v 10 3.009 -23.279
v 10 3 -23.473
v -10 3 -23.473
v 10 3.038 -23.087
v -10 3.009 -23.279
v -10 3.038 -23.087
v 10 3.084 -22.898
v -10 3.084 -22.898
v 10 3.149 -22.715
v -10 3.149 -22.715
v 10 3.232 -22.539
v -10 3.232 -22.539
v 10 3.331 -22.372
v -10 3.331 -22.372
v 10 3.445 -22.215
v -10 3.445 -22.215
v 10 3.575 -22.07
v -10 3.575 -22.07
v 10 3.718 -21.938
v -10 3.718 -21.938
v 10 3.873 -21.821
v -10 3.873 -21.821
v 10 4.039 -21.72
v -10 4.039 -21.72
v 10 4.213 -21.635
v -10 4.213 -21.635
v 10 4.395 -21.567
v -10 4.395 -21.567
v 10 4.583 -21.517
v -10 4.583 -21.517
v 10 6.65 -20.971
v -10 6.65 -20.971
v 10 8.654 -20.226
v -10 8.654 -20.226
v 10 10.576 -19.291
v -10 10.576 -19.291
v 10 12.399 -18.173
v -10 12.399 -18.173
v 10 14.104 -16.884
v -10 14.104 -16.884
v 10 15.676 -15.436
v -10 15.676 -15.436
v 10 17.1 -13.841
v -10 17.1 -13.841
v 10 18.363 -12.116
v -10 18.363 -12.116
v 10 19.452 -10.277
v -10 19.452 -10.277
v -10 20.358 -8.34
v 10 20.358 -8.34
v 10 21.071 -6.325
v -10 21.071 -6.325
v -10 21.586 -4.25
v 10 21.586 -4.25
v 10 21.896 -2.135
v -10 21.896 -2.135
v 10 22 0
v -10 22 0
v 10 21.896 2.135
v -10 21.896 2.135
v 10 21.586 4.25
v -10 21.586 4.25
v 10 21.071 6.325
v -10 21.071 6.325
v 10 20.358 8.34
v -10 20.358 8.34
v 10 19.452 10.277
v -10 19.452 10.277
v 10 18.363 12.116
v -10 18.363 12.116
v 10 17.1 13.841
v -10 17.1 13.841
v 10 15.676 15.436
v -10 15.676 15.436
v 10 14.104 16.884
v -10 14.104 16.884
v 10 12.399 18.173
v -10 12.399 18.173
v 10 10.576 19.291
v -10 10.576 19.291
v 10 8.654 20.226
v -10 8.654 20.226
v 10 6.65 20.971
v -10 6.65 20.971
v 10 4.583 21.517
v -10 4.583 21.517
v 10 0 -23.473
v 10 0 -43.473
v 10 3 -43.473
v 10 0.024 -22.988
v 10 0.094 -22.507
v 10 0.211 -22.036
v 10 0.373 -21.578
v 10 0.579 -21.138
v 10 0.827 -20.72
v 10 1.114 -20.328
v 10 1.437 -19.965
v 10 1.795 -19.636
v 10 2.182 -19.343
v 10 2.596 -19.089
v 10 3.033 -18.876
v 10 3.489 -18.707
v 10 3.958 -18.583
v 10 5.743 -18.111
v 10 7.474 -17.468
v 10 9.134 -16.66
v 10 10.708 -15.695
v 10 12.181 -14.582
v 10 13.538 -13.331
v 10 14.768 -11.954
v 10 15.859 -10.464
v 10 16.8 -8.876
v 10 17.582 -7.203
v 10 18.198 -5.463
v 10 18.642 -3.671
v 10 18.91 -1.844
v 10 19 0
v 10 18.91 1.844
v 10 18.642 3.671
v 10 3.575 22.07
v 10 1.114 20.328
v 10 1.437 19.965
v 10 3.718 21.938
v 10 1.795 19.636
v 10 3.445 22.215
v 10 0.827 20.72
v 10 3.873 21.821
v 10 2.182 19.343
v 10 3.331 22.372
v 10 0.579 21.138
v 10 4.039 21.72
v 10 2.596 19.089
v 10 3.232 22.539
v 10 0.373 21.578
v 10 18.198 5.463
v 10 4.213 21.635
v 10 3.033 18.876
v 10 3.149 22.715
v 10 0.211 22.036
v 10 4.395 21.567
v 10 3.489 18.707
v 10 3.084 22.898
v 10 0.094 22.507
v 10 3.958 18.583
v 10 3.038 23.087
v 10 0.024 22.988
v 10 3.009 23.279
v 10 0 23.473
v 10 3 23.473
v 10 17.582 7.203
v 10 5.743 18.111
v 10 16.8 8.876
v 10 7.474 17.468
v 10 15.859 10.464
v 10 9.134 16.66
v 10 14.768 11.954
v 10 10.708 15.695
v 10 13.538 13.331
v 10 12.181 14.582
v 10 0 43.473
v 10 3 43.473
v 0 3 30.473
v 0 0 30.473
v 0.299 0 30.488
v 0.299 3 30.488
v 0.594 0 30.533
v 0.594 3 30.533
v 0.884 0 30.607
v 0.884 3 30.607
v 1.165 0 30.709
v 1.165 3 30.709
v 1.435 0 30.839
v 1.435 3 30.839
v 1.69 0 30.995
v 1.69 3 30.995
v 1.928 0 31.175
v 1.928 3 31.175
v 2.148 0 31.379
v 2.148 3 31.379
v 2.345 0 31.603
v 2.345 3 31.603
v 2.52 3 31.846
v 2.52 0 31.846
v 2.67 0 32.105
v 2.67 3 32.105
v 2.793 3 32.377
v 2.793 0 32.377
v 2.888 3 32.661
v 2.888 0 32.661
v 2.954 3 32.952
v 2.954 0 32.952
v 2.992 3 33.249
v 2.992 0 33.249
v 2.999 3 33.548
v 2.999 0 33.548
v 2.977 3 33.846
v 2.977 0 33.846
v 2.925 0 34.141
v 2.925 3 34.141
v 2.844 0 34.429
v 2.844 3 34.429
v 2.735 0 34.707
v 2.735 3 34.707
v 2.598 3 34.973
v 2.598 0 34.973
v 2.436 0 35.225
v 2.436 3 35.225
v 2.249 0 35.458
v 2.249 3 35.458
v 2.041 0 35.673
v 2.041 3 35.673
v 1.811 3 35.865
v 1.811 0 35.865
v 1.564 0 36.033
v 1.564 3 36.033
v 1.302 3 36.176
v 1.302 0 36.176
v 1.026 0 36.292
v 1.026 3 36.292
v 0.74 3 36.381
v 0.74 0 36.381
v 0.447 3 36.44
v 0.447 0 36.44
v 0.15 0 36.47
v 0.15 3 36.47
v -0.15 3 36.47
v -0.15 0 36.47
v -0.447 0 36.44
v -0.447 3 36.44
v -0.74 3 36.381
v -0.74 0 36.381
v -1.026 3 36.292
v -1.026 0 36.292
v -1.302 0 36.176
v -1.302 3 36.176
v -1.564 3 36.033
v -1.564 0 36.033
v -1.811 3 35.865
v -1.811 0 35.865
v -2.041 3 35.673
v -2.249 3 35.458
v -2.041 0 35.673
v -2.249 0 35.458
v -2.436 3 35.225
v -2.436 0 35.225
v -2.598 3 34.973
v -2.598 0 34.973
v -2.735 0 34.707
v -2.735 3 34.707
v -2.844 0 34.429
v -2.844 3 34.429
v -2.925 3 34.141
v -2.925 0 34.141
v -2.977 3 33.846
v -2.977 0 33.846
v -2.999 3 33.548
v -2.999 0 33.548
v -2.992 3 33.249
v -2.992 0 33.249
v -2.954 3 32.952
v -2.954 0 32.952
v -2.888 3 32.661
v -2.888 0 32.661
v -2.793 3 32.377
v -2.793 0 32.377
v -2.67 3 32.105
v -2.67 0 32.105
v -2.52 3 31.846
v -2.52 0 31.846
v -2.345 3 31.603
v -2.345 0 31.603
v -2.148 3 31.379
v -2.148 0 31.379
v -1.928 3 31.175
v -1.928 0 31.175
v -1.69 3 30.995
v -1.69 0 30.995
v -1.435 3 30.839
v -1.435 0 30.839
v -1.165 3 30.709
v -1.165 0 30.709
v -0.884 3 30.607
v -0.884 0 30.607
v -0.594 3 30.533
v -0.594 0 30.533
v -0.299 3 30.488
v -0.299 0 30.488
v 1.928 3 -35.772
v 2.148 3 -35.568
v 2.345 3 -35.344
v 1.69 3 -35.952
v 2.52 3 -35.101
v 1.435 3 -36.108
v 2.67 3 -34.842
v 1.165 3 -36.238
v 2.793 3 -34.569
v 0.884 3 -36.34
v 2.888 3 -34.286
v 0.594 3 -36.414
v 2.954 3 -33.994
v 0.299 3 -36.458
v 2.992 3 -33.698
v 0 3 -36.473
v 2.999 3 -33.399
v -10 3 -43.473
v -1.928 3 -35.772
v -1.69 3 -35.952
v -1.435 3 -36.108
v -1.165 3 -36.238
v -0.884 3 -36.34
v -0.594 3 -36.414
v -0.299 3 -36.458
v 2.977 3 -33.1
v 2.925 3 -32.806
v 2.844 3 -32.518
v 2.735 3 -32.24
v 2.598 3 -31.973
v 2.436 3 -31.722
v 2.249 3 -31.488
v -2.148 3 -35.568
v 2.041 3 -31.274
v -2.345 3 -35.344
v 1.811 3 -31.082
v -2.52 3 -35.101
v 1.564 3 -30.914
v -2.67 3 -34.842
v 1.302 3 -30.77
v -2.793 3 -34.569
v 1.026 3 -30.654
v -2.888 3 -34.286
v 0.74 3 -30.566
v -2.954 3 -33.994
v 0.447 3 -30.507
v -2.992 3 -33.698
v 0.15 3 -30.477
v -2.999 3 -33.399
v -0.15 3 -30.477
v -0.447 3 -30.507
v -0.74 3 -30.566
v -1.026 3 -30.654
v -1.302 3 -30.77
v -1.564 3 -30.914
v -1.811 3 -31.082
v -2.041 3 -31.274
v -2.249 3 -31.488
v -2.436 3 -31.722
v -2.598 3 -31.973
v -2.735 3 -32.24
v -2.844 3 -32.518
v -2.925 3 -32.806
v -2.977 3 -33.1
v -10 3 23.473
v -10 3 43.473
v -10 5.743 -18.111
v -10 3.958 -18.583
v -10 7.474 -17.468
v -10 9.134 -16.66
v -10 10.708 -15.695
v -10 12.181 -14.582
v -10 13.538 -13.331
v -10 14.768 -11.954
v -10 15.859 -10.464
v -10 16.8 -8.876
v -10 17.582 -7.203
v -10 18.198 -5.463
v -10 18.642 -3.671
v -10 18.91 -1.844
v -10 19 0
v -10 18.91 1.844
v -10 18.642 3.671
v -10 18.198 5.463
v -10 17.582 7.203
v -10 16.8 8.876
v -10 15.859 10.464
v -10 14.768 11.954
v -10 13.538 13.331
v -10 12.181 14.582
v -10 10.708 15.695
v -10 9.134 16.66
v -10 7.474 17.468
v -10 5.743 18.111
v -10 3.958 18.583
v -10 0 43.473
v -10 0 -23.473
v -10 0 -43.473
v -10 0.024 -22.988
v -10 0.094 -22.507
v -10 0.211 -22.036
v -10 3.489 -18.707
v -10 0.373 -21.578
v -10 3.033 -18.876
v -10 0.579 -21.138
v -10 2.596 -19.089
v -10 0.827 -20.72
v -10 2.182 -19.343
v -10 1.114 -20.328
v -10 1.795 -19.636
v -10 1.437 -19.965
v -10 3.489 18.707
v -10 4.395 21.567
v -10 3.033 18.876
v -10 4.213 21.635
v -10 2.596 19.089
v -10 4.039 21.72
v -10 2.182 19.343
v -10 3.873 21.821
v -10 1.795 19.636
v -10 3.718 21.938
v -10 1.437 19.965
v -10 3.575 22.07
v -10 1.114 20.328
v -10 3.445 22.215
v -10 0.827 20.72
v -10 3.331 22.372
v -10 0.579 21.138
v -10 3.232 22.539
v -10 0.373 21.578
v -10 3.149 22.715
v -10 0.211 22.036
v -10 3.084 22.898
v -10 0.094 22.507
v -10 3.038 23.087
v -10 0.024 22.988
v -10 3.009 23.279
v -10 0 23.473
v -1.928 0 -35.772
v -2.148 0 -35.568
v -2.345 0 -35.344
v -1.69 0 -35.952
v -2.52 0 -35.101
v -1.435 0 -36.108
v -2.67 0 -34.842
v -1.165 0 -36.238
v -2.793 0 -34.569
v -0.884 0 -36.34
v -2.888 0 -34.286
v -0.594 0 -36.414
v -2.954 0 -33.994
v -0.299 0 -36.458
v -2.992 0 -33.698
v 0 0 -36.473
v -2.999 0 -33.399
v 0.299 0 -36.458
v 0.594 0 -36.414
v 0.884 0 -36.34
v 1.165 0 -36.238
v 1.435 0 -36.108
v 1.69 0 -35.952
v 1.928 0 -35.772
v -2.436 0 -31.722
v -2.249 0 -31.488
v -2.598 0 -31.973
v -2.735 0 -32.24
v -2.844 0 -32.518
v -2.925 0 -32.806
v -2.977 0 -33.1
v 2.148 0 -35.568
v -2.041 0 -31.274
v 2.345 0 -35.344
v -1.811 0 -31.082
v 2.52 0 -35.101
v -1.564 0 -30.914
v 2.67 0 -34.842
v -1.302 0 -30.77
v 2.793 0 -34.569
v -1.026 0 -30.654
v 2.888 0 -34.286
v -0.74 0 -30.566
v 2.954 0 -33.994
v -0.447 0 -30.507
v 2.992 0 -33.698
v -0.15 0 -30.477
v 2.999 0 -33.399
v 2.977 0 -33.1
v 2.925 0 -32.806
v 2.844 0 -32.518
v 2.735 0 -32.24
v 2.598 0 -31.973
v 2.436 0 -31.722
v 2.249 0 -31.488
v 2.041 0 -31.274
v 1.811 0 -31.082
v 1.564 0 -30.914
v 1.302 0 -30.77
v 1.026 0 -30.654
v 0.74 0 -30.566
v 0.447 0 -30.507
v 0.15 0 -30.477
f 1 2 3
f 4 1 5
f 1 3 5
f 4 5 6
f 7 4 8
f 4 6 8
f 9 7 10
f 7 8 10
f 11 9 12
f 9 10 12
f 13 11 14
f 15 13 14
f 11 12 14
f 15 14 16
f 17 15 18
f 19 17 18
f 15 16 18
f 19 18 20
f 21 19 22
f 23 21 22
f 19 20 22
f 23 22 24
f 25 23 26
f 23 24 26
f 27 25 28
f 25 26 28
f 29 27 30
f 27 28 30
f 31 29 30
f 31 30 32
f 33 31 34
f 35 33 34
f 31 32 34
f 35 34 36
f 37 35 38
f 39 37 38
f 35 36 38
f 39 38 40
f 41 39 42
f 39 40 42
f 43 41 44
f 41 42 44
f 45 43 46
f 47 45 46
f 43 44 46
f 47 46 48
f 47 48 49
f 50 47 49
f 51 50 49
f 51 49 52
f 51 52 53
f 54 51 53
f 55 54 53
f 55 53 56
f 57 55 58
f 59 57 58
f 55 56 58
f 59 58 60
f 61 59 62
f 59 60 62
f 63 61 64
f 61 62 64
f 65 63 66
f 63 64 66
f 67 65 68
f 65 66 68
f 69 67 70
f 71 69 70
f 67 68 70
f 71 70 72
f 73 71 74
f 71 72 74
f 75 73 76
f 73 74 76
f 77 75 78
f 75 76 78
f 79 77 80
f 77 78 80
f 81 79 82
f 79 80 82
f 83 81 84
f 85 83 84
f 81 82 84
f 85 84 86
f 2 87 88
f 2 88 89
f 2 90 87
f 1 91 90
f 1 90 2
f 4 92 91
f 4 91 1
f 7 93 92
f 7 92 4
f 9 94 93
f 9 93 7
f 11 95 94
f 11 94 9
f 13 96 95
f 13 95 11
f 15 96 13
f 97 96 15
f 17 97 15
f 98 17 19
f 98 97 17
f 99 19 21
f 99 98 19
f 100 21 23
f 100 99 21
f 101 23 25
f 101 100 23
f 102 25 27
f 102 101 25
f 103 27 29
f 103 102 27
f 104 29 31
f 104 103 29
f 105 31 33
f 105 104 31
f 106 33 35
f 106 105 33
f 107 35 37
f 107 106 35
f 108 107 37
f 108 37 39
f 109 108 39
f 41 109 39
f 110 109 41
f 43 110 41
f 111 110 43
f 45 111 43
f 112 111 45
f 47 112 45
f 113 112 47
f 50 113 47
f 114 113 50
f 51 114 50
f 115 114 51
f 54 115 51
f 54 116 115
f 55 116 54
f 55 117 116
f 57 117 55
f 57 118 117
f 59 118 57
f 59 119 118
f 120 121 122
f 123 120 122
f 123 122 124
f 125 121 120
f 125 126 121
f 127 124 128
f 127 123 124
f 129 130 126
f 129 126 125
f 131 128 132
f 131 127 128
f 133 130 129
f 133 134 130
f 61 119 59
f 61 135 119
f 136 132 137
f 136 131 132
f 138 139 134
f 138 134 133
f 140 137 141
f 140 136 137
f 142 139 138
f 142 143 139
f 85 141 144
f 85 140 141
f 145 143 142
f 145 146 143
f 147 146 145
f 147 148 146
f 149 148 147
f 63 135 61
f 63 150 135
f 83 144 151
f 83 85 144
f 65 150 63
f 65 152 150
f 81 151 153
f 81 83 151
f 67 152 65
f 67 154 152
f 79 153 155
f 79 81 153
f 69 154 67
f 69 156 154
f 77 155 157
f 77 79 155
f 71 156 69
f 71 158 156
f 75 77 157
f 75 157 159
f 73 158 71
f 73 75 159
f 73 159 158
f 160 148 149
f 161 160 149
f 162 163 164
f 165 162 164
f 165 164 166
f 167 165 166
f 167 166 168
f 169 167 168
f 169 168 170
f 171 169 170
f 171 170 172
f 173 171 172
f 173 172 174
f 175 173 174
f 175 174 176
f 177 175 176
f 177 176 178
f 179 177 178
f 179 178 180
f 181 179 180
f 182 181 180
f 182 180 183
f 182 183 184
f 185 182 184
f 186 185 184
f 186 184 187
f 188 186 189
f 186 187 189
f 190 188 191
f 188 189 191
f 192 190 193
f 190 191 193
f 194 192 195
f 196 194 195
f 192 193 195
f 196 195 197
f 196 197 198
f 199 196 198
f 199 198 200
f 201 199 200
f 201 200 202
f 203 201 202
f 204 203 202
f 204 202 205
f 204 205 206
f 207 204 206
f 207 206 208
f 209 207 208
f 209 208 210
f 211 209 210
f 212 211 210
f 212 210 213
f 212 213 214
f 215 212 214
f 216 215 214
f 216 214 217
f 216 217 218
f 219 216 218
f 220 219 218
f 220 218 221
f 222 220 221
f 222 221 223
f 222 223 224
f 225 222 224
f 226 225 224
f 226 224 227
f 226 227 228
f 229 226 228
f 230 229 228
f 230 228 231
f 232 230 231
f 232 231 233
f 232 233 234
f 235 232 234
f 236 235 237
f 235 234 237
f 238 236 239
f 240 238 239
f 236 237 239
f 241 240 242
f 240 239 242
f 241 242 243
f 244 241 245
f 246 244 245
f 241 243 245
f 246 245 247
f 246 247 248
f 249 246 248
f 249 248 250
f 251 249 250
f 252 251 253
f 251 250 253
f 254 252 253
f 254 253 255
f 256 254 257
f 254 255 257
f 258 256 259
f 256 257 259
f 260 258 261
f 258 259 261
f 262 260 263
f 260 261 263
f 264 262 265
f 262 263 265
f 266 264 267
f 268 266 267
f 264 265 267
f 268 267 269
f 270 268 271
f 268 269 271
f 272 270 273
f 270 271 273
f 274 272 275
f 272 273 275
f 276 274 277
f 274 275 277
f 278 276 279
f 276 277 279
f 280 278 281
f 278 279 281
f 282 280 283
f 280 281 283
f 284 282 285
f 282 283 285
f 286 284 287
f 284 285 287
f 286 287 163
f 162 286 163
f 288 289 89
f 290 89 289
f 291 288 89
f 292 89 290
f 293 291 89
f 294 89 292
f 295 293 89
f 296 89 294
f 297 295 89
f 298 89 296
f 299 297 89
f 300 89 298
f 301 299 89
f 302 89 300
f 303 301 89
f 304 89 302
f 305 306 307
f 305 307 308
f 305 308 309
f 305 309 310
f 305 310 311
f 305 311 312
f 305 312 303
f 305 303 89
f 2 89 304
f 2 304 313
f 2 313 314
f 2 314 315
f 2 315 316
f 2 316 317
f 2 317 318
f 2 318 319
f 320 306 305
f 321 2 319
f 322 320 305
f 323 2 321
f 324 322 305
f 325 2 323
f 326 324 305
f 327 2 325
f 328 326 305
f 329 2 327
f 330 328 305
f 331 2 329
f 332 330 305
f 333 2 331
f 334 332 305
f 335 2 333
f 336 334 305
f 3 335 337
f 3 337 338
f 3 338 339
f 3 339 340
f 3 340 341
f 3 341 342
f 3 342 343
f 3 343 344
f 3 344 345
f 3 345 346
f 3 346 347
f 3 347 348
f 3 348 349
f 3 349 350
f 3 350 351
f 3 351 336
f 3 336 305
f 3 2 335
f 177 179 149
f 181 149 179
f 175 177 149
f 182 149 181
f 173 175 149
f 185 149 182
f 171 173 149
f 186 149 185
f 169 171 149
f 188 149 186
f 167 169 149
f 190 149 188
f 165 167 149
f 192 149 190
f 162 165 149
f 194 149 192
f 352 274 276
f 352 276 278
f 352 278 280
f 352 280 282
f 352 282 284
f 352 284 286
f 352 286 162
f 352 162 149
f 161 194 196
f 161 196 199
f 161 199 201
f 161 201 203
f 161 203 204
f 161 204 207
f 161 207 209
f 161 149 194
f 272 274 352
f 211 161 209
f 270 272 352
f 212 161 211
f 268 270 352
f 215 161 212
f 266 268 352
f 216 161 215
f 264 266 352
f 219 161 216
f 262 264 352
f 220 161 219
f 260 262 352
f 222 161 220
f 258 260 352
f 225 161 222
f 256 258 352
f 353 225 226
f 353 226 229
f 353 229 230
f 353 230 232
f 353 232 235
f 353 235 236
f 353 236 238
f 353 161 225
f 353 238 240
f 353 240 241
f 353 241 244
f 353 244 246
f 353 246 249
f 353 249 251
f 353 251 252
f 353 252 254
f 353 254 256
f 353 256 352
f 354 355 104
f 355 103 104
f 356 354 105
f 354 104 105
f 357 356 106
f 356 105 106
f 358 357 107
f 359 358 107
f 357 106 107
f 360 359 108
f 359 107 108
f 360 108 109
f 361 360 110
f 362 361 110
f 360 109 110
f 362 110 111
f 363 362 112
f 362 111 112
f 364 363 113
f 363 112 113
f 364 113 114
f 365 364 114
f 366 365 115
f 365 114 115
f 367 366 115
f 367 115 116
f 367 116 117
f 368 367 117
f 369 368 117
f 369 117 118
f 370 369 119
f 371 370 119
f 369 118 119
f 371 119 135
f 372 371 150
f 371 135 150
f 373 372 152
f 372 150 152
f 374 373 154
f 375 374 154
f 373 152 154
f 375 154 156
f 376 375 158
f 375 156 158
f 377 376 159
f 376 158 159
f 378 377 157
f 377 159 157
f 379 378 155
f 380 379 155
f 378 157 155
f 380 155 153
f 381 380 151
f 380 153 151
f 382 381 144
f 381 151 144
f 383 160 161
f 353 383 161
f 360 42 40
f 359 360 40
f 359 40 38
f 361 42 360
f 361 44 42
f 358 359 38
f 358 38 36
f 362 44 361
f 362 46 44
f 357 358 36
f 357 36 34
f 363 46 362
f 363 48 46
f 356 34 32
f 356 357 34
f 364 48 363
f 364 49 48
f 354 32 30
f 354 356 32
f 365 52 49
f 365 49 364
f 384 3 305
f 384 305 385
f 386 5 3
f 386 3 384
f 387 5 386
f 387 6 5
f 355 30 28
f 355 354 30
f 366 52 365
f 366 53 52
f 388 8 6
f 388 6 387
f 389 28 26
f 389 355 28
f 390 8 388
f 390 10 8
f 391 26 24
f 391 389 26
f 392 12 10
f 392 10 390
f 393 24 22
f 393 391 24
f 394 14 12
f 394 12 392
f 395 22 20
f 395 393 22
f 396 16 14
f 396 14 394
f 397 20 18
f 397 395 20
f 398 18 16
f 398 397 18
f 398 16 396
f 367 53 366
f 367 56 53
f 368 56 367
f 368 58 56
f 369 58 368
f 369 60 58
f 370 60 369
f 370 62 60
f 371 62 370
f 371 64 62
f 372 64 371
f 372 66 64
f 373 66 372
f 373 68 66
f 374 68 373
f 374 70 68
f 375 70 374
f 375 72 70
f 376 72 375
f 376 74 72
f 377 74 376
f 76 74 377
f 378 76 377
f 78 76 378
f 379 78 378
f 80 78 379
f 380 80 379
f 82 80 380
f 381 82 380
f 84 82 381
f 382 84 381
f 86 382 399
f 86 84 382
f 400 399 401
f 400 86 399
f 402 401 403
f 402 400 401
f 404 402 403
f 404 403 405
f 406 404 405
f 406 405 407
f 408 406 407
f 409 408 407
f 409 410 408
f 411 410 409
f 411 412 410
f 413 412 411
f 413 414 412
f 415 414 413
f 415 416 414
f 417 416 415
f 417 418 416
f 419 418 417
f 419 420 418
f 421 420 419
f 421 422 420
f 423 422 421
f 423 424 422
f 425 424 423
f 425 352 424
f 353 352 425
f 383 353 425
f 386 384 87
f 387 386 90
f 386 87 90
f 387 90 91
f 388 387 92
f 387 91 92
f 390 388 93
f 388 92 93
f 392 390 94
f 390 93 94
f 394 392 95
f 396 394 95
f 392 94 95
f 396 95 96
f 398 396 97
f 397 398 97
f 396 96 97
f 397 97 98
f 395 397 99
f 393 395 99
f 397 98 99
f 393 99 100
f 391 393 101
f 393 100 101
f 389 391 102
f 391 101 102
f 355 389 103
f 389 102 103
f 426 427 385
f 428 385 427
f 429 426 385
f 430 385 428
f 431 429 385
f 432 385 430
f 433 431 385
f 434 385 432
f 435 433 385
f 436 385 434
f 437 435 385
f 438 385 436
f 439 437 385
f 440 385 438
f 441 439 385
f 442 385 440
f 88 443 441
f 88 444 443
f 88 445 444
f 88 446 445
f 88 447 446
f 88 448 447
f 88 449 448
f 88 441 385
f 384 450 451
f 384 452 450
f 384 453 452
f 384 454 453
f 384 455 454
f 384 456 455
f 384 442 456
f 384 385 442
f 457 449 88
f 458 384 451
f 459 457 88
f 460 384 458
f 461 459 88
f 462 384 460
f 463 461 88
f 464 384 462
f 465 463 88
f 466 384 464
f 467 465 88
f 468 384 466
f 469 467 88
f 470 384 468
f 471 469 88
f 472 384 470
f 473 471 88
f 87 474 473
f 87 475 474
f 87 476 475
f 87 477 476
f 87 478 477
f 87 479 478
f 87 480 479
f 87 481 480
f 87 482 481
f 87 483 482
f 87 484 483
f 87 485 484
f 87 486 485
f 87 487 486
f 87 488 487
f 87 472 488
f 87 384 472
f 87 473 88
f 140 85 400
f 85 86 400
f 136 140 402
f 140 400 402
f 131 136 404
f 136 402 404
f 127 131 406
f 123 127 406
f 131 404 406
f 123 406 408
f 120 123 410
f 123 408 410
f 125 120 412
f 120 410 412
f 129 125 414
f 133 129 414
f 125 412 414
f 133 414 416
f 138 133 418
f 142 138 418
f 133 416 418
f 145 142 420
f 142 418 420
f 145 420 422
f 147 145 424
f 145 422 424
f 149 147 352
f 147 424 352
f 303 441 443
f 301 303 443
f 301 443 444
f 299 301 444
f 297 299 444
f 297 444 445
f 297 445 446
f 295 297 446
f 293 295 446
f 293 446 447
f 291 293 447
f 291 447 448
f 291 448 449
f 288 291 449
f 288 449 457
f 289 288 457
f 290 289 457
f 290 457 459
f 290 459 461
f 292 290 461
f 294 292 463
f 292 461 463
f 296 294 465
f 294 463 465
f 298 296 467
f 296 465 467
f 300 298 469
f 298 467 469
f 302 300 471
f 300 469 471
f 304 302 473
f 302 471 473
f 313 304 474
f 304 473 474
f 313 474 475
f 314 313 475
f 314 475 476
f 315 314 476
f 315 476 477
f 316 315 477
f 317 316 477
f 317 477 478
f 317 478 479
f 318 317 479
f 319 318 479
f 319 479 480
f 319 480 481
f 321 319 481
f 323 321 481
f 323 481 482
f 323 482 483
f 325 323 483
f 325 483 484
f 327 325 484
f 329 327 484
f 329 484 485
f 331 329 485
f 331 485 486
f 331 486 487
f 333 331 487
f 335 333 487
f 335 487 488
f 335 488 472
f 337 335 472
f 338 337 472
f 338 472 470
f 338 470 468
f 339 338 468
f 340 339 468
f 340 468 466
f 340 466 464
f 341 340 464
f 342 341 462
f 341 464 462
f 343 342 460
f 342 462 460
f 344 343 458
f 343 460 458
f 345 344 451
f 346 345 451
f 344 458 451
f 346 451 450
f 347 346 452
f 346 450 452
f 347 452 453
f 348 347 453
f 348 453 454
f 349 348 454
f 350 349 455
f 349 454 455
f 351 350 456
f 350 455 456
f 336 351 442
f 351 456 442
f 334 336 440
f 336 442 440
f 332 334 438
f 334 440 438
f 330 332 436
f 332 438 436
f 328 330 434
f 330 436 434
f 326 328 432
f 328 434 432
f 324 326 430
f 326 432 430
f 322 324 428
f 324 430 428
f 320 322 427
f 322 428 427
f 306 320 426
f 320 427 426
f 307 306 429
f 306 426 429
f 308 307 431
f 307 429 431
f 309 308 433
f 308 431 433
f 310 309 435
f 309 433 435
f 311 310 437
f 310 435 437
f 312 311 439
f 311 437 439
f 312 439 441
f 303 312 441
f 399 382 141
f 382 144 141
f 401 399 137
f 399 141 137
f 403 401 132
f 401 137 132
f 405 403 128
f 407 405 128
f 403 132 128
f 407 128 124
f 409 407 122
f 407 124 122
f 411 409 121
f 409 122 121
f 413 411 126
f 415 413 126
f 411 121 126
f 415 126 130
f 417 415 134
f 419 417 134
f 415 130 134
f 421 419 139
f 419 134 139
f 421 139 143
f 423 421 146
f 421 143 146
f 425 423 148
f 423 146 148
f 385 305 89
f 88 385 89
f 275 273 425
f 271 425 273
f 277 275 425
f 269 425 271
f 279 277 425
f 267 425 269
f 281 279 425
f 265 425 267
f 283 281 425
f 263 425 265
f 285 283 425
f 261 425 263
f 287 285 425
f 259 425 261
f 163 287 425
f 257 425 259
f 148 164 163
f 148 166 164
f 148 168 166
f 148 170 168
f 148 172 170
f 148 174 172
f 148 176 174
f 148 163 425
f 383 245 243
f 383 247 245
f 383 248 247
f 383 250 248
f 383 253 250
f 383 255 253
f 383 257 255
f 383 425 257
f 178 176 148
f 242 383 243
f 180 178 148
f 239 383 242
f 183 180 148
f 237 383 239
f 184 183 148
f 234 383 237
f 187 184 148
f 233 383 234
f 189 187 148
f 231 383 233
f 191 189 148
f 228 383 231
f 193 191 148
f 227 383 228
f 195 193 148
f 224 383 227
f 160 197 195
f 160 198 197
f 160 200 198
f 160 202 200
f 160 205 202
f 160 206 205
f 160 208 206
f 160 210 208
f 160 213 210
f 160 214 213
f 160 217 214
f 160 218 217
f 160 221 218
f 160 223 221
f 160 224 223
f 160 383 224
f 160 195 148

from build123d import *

# Parameters (mm, degrees)
SKETCH8_W          = 20
SKETCH8_H          = 3
SKETCH10_R         = 3
CUT_EXTRUDE1_DEPTH = 50.738672756


with BuildPart() as part:
    # Sweep1: sweep along a path in Sketch7
    with BuildLine(Plane(origin=(0, 0, 0), x_dir=(0, 0, -1), z_dir=(1, 0, 0))) as sweep1_path:
        Line((43.473389189, 0), (23.473389189, 0))
        ThreePointArc((23.473389189, 0), (20.327624841, 1.113592061), (18.583099774, 3.958333333))
        ThreePointArc((18.583099774, 3.958333333), (0, 19), (-18.583099774, 3.958333333))
        ThreePointArc((-18.583099774, 3.958333333), (-20.327624841, 1.113592061), (-23.473389189, 0))
        Line((-23.473389189, 0), (-43.473389189, 0))
    # Sketch8 → Sweep1 (sweep)
    with BuildSketch(Plane.XY.offset(-43.473389189)):
        with Locations((0, 1.5)):
            Rectangle(SKETCH8_W, SKETCH8_H)
    sweep(path=sweep1_path.line)

    # Sketch10 → Cut-Extrude1 (cut, through all)
    with BuildSketch(Plane(origin=(0, 0, 0), x_dir=(-1, 0, 0), z_dir=(0, -1, 0))):
        with Locations(Location((0, 33.473389189, 0), (0, 0, 90))):
            Circle(SKETCH10_R)
        with Locations(Location((0, -33.473389189, 0), (0, 0, 90))):
            Circle(SKETCH10_R)
    extrude(amount=-CUT_EXTRUDE1_DEPTH, mode=Mode.SUBTRACT)


solid = part.part
